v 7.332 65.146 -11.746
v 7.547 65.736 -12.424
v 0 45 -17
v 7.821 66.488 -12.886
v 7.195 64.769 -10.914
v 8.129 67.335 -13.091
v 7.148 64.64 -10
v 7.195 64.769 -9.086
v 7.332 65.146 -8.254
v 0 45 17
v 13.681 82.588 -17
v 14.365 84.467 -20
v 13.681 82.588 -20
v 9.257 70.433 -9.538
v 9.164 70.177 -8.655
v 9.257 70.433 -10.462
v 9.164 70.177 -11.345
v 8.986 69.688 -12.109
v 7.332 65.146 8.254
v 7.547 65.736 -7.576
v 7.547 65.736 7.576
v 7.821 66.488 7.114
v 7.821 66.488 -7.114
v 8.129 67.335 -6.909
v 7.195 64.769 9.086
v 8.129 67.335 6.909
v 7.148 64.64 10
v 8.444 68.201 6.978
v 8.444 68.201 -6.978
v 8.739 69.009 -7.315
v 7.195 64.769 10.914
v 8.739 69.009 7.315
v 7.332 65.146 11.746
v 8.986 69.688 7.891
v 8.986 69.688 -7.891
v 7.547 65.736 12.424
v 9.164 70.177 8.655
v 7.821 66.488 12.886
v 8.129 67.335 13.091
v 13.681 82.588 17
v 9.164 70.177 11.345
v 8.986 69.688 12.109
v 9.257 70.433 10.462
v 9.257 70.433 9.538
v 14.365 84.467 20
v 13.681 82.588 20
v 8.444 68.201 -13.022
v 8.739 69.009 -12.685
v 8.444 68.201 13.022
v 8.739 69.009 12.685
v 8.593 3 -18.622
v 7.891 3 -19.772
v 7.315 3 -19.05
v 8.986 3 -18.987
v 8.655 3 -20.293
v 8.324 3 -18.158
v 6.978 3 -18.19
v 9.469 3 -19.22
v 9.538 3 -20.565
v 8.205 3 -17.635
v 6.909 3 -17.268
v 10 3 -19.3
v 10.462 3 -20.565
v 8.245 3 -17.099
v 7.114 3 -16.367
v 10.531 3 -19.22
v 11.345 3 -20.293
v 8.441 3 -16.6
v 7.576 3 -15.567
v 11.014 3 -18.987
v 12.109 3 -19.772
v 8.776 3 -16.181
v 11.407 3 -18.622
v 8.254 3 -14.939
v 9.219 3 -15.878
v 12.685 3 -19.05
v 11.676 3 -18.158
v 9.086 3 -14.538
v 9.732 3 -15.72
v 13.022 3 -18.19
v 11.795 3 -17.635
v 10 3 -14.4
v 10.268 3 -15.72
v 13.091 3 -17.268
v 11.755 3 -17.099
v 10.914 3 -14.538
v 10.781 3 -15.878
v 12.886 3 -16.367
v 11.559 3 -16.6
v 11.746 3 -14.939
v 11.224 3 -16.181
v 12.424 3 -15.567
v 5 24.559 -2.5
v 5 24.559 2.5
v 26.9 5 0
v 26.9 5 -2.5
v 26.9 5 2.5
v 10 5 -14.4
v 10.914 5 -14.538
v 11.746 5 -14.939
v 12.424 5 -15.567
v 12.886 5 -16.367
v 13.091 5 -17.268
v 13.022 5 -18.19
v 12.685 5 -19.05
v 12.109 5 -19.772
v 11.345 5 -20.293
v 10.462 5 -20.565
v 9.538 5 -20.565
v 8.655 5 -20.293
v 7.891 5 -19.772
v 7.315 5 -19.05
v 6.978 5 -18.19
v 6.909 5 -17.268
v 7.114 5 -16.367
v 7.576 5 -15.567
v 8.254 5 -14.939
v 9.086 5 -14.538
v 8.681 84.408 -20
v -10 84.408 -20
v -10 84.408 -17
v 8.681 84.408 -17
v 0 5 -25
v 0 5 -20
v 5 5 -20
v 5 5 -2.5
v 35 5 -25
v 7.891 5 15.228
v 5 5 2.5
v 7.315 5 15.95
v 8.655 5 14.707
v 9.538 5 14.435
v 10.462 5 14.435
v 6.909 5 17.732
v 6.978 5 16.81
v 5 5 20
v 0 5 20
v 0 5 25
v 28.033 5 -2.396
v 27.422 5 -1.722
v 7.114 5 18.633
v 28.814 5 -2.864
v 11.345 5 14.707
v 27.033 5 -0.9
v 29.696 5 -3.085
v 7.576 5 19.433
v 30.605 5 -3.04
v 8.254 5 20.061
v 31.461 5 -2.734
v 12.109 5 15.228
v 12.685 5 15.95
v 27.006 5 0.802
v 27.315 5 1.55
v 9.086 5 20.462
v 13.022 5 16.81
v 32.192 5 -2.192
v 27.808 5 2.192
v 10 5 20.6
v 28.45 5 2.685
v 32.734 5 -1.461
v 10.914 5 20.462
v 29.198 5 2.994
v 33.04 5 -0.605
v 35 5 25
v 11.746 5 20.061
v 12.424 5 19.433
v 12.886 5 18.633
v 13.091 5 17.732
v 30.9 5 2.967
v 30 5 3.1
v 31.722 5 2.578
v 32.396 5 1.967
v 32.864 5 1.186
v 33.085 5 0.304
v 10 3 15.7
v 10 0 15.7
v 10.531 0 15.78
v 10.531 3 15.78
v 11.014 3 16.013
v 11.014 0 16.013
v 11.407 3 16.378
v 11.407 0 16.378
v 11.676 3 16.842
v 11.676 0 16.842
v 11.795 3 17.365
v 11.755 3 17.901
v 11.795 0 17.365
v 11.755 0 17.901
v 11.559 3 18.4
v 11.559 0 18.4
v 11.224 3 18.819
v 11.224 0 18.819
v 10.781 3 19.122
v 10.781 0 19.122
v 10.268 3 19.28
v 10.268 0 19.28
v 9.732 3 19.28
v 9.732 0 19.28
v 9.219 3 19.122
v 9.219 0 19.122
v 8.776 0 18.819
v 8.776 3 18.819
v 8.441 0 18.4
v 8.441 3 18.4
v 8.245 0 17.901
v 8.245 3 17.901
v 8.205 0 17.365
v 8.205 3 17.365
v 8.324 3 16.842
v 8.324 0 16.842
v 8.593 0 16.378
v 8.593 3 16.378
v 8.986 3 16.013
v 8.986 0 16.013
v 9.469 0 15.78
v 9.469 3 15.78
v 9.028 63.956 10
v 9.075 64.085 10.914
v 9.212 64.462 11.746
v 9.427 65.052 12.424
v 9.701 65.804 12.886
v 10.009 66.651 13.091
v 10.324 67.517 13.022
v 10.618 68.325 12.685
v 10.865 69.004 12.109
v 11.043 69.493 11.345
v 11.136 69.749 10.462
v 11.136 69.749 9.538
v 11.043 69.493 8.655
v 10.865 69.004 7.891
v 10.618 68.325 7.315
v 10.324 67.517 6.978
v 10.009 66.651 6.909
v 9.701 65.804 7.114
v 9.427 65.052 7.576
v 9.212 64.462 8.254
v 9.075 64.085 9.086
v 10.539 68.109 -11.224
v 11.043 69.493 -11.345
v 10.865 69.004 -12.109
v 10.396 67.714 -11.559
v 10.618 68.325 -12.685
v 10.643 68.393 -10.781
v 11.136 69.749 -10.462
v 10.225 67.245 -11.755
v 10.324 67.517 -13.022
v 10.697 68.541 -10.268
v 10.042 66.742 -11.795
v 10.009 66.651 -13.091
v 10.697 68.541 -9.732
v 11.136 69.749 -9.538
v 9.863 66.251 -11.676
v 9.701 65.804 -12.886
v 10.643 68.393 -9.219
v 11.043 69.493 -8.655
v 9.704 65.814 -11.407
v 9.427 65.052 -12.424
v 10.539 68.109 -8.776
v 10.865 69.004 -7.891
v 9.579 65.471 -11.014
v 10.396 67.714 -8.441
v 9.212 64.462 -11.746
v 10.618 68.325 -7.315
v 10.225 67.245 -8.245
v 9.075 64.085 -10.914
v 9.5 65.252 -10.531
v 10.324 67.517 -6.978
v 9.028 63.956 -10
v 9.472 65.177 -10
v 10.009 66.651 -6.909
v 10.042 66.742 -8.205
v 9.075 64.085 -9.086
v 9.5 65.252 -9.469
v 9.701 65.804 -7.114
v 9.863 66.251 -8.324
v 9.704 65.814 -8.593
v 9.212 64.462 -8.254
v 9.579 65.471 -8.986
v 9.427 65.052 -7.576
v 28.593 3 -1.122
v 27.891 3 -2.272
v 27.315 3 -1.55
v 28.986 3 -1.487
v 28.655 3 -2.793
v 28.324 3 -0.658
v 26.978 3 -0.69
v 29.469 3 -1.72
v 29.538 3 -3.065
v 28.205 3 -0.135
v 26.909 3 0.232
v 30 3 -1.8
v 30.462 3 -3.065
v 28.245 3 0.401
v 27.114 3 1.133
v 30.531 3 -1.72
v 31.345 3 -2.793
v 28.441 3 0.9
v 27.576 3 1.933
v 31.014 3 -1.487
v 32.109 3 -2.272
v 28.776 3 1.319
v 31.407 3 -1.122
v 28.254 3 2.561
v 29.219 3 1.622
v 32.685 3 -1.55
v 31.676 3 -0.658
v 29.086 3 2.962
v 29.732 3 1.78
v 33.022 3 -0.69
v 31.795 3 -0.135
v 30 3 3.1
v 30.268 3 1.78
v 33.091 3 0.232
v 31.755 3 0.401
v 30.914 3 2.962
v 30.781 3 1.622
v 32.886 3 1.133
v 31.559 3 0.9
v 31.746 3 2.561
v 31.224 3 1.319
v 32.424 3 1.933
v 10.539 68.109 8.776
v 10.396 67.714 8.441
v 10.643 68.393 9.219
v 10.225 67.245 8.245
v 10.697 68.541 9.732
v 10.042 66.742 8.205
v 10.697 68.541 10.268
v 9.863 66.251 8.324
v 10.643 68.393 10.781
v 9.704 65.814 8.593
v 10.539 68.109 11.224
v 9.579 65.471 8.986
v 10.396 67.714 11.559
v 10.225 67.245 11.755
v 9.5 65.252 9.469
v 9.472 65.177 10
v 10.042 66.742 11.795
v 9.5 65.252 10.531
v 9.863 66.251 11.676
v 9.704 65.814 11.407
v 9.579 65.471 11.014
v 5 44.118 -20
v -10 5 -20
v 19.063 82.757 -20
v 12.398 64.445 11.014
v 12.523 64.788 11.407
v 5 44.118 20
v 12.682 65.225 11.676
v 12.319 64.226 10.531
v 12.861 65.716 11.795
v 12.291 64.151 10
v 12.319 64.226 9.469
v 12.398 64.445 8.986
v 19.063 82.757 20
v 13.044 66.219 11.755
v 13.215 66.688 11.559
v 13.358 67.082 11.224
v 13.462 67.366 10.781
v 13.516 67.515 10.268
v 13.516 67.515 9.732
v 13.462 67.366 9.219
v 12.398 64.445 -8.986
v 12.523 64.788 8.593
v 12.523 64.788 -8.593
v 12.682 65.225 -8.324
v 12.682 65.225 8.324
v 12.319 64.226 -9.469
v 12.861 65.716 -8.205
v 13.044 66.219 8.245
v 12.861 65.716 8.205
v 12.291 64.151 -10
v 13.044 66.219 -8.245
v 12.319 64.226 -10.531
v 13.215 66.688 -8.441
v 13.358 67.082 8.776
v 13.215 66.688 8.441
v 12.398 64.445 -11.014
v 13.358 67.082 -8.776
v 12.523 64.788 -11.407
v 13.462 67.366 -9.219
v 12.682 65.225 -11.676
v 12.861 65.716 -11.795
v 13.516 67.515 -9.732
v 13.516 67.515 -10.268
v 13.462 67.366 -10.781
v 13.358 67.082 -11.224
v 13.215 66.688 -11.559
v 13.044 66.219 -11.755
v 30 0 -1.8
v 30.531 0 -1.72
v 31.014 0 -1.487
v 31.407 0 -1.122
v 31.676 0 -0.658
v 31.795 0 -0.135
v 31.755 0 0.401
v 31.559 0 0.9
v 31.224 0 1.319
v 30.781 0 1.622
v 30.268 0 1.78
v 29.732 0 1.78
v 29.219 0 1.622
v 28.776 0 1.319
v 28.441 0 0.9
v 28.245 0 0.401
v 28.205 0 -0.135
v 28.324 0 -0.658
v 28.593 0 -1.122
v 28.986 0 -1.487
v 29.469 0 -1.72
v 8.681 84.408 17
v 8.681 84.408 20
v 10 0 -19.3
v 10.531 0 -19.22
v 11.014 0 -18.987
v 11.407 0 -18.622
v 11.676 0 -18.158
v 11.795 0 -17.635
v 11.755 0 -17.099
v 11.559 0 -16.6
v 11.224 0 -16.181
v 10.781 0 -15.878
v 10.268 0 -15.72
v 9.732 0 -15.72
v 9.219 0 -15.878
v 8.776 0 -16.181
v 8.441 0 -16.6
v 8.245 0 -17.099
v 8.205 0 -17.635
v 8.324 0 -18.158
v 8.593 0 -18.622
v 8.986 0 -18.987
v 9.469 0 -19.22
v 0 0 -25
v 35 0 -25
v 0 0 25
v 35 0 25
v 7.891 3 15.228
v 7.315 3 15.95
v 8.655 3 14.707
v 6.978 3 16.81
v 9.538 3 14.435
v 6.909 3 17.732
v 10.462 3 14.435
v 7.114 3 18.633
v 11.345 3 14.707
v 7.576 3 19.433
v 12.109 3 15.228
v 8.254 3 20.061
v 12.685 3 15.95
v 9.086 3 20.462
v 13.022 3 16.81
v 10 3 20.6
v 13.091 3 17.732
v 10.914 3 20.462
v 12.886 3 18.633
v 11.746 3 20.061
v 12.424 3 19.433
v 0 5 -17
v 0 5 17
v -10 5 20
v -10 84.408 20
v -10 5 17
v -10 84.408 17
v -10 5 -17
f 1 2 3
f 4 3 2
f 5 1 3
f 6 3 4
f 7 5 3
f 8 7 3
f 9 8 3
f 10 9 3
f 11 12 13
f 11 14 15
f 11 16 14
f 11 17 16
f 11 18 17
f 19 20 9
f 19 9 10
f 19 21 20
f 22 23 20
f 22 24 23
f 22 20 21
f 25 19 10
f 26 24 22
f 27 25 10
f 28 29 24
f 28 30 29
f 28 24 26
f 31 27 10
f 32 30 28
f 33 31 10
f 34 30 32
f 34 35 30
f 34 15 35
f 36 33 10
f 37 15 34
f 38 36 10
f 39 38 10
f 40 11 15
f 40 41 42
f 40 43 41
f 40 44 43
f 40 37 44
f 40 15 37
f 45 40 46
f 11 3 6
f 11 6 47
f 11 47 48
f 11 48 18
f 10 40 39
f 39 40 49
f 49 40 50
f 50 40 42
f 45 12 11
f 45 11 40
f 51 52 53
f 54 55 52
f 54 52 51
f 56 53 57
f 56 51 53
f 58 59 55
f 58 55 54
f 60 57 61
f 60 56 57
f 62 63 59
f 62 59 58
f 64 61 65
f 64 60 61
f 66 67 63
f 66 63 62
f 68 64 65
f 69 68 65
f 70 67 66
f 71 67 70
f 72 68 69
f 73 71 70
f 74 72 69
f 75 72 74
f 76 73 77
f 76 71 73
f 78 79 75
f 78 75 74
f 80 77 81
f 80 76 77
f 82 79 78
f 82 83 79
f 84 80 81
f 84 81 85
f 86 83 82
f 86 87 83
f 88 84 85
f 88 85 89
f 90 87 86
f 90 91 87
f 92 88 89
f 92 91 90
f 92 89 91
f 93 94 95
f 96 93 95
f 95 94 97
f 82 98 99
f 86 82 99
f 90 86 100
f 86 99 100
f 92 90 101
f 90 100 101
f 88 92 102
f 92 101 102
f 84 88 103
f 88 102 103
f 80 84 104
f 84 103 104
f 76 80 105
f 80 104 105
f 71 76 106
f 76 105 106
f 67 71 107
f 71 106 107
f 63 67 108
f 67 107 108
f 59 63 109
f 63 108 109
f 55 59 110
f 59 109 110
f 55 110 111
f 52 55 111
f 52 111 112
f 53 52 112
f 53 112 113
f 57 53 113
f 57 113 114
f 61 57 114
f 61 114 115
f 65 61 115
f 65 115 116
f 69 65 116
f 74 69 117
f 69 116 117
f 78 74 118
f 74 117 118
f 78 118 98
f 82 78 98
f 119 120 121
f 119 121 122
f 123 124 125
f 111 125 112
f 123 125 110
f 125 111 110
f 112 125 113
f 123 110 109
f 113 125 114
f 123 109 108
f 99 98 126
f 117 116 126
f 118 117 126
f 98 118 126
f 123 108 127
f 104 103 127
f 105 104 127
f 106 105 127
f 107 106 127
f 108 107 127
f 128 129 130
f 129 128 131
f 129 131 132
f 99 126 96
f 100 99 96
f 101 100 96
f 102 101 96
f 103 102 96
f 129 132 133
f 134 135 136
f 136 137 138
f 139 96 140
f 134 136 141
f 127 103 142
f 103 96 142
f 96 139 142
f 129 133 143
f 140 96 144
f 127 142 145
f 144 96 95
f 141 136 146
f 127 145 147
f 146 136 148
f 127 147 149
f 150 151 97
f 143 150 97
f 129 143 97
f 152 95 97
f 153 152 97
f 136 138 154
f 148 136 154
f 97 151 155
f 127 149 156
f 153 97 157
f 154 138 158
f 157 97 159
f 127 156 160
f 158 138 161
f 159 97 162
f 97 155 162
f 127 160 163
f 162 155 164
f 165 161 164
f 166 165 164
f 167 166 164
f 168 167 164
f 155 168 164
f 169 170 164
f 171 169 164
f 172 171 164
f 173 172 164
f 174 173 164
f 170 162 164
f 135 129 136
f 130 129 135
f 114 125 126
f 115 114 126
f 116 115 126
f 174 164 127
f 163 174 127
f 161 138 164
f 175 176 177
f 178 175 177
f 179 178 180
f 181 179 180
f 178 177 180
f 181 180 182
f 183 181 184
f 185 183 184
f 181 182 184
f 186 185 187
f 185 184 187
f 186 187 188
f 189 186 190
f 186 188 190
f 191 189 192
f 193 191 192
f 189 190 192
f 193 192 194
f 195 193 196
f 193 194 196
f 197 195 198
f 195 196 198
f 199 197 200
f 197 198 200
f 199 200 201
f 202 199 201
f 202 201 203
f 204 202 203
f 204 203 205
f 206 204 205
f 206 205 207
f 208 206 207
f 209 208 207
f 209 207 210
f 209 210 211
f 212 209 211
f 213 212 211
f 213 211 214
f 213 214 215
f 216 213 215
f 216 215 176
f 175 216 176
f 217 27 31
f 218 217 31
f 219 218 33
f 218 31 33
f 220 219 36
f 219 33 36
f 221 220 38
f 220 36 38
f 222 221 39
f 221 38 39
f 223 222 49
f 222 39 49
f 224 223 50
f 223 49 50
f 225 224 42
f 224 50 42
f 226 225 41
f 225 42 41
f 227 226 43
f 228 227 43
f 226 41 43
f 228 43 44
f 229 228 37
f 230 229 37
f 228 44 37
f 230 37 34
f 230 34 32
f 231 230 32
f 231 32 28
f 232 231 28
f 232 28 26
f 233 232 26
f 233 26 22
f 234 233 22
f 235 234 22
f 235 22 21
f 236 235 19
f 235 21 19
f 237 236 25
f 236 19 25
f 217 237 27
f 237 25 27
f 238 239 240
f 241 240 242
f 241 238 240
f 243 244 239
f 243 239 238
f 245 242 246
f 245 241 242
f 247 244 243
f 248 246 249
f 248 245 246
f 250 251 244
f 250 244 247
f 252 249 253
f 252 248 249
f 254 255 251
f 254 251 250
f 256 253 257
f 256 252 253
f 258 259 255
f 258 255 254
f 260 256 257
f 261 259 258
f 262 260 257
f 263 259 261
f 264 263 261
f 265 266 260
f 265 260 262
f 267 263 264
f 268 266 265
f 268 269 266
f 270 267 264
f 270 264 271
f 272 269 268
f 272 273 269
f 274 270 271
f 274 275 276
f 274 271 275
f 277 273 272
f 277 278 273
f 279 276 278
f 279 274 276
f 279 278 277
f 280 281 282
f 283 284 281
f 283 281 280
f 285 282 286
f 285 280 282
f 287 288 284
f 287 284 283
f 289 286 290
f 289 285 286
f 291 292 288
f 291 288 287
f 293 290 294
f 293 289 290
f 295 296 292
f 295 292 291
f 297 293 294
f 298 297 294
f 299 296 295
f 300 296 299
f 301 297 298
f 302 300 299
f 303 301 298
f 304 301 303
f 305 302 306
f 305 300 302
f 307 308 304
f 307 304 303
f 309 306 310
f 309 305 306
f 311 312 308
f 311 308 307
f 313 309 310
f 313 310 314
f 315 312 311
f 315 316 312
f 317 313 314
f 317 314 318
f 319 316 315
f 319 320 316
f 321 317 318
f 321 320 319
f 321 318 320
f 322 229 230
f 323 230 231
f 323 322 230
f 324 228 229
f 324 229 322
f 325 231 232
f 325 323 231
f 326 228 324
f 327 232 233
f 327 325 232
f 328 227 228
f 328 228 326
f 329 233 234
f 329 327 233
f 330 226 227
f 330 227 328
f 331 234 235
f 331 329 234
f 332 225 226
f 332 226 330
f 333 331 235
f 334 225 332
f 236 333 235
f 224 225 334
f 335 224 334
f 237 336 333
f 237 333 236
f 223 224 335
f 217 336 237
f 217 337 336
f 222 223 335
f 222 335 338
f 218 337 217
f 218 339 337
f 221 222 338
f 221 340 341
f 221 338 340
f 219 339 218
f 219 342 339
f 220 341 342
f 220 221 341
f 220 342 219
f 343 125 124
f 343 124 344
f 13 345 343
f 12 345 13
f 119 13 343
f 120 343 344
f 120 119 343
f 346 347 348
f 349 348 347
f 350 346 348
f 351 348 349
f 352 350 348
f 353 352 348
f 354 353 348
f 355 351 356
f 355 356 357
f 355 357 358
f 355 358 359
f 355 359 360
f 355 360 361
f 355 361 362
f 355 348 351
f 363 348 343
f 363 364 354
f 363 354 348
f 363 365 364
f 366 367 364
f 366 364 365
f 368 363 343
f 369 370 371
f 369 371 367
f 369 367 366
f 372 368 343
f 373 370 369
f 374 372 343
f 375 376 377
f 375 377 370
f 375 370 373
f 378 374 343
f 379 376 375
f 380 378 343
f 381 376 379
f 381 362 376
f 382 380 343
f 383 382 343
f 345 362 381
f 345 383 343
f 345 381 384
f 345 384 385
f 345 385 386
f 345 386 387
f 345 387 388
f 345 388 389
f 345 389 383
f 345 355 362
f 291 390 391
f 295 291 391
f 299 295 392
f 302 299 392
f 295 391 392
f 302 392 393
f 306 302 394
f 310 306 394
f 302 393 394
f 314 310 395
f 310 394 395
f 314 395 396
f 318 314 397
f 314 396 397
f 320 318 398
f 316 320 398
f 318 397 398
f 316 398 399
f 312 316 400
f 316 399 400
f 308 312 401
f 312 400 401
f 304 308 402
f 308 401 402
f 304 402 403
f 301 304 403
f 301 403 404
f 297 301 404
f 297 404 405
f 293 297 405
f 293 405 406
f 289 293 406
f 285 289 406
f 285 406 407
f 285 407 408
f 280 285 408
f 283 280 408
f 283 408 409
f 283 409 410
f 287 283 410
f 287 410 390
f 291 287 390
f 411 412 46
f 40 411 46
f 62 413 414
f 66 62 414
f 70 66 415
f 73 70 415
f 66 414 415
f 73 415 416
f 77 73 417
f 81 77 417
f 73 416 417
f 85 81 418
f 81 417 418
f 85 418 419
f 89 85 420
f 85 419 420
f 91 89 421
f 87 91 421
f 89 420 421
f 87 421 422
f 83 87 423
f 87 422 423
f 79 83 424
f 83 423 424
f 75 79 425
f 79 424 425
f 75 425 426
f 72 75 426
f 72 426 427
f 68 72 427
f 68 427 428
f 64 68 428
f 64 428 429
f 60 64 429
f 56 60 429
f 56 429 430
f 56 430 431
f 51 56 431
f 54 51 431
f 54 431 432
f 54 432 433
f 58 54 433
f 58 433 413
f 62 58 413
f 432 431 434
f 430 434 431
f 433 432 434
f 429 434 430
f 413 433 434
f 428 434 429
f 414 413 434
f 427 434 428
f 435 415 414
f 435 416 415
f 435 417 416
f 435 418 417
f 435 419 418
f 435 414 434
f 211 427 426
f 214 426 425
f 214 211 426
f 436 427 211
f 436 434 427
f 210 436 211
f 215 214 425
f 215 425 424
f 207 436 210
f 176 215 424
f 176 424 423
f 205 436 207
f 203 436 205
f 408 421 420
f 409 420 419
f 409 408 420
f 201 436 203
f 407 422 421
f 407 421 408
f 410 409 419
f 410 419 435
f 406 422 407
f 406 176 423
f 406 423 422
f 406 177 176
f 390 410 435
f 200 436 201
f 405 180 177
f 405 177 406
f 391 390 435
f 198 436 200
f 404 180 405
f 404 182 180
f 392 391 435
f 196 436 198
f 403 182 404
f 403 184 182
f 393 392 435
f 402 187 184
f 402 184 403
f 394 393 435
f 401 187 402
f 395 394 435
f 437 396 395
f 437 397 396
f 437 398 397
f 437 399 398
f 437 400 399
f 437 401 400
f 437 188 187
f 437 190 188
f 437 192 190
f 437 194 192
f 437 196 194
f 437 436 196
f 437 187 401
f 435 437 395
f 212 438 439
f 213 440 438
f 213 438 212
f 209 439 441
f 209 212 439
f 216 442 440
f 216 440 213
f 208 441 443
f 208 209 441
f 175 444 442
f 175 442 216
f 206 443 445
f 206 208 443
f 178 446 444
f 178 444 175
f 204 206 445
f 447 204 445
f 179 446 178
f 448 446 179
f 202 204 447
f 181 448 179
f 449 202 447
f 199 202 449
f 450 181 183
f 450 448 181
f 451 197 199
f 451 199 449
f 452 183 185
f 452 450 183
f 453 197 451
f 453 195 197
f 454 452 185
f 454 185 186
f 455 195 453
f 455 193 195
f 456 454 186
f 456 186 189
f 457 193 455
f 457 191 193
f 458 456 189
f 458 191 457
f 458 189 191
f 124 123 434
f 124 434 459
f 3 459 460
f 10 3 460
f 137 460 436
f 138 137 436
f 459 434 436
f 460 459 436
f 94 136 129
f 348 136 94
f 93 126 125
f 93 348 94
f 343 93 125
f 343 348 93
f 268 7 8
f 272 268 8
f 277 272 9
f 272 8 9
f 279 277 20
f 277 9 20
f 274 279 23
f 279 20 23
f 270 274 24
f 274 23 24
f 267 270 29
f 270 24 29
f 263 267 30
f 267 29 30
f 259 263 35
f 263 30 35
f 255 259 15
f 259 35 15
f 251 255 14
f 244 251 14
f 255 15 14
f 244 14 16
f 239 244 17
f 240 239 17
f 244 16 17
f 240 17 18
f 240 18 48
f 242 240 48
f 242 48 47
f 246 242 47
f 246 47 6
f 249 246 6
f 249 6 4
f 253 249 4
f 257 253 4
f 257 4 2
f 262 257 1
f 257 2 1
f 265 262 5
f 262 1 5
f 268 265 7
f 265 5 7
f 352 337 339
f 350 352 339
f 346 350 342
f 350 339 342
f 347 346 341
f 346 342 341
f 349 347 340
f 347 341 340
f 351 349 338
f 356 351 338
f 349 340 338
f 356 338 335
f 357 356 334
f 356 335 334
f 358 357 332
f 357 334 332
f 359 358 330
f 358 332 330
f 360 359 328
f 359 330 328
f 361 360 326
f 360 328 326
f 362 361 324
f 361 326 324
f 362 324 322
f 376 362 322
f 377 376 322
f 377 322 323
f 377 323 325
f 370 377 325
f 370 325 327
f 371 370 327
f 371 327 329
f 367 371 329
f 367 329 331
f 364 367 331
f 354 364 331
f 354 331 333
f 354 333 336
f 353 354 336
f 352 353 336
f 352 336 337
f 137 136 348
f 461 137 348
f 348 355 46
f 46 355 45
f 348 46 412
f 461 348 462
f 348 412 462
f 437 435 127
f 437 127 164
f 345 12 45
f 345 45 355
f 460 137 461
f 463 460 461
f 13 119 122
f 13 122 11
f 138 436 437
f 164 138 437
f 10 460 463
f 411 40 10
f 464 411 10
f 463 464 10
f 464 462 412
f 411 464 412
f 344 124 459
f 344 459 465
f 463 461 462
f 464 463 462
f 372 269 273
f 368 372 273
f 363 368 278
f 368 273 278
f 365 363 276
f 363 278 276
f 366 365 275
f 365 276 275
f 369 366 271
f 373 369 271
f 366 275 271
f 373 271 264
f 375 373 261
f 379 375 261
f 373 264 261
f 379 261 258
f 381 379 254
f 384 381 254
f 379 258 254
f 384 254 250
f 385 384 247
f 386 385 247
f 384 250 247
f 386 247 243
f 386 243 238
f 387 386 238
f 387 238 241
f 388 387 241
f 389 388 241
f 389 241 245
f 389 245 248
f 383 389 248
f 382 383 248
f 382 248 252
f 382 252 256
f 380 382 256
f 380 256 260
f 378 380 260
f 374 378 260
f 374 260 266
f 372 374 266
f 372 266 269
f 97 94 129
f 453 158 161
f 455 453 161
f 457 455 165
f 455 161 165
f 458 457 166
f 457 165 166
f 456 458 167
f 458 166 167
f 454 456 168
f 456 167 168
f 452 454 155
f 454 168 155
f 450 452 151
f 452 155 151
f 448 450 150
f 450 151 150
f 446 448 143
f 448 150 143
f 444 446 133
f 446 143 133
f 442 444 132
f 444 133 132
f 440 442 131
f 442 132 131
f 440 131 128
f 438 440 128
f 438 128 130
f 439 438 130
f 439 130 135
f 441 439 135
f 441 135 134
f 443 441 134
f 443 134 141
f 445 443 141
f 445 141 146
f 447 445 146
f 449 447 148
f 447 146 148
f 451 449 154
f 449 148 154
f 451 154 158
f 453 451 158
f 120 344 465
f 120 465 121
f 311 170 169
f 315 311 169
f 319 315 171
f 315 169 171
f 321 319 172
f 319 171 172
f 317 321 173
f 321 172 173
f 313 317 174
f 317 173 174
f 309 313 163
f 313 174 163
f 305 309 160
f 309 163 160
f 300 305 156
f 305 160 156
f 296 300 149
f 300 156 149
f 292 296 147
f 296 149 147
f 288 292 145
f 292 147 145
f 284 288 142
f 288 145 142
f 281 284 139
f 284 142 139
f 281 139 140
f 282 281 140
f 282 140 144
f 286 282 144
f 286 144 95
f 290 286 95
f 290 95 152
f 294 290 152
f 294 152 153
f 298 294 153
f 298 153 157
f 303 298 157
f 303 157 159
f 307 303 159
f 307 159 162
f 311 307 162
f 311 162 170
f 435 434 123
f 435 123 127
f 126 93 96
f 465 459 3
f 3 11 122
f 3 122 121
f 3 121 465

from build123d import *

# Parameters (mm, degrees)
SKETCH_2_W          = 5
SKETCH_2_H          = 40
CUT_EXTRUDE_1_REACH = 90.301
SKETCH_3_R          = 1.8
SKETCH_6_W          = 30
SKETCH_6_H          = 40
EXTRUDE_1_DEPTH     = 5
CUT_EXTRUDE_2_REACH = 95.593
SKETCH_8_R          = 1.8
SKETCH_9_W          = 35
SKETCH_9_H          = 5
EXTRUDE_2_DEPTH     = 5
SKETCH_10_R         = 3.1
CUT_EXTRUDE_3_DEPTH = 2
SKETCH_11_R         = 3.1
CUT_EXTRUDE_4_DEPTH = 2
EXTRUDE_4_DEPTH     = 3
RIB_5_REACH         = 96.788
SKETCH_21_WALL_W    = 220.937961122
SKETCH_21_WALL_H    = 5


with BuildPart() as part:
    # 扫描1: sweep along a path in 草图1
    with BuildLine(Plane.XY) as sweep_1_path:
        Line((0, 0), (0, 45))
        Line((0, 45), (14.36484602, 84.467090073))
    # 草图2 → 扫描1 (sweep)
    with BuildSketch(Plane(origin=(0, 0, 0), x_dir=(1, 0, 0), z_dir=(0, 1, 0))):
        with Locations((2.5, 0)):
            Rectangle(SKETCH_2_W, SKETCH_2_H)
    sweep(path=sweep_1_path.line, transition=Transition.RIGHT)

    # 草图3 → 切除-拉伸1 (cut, up to next)
    with BuildSketch(Plane(origin=(-14.462721218, 5.26400003, 0), x_dir=(0, 0, 1), z_dir=(-0.9396926207859081, 0.3420201433256695, 0)), mode=Mode.PRIVATE) as cut_extrude_1_sk1:
        with Locations(Location((-10, 66.286167935, 0), (0, 0, 270))):
            Circle(SKETCH_3_R)
    cut_extrude_1_tool1 = extrude(cut_extrude_1_sk1.sketch, amount=-CUT_EXTRUDE_1_REACH, mode=Mode.PRIVATE) & part.part
    # 草图3 → 切除-拉伸1 (cut, up to next)
    with BuildSketch(Plane(origin=(-14.462721218, 5.26400003, 0), x_dir=(0, 0, 1), z_dir=(-0.9396926207859081, 0.3420201433256695, 0)), mode=Mode.PRIVATE) as cut_extrude_1_sk2:
        with Locations(Location((10, 66.286167935, 0), (0, 0, 270))):
            Circle(SKETCH_3_R)
    cut_extrude_1_tool2 = extrude(cut_extrude_1_sk2.sketch, amount=-CUT_EXTRUDE_1_REACH, mode=Mode.PRIVATE) & part.part
    add(cut_extrude_1_tool1.solids().sort_by_distance((8.208483, 67.552623, -10))[0], mode=Mode.SUBTRACT)
    add(cut_extrude_1_tool2.solids().sort_by_distance((8.208483, 67.552623, 10))[0], mode=Mode.SUBTRACT)

    # 草图6 → 凸台-拉伸1 (add)
    with BuildSketch(Plane.XZ):
        with Locations((20, 0)):
            Rectangle(SKETCH_6_W, SKETCH_6_H)
    extrude(amount=-EXTRUDE_1_DEPTH)

    # 草图8 → 切除-拉伸2 (cut, up to next)
    with BuildSketch(Plane.XZ, mode=Mode.PRIVATE) as cut_extrude_2_sk1:
        with Locations(Location((10, 17.5, 0), (0, 0, 270))):
            Circle(SKETCH_8_R)
    cut_extrude_2_tool1 = extrude(cut_extrude_2_sk1.sketch, amount=-CUT_EXTRUDE_2_REACH, mode=Mode.PRIVATE) & part.part
    # 草图8 → 切除-拉伸2 (cut, up to next)
    with BuildSketch(Plane.XZ, mode=Mode.PRIVATE) as cut_extrude_2_sk2:
        with Locations(Location((10, -17.5, 0), (0, 0, 270))):
            Circle(SKETCH_8_R)
    cut_extrude_2_tool2 = extrude(cut_extrude_2_sk2.sketch, amount=-CUT_EXTRUDE_2_REACH, mode=Mode.PRIVATE) & part.part
    # 草图8 → 切除-拉伸2 (cut, up to next)
    with BuildSketch(Plane.XZ, mode=Mode.PRIVATE) as cut_extrude_2_sk3:
        with Locations(Location((30, 0, 0), (0, 0, 270))):
            Circle(SKETCH_8_R)
    cut_extrude_2_tool3 = extrude(cut_extrude_2_sk3.sketch, amount=-CUT_EXTRUDE_2_REACH, mode=Mode.PRIVATE) & part.part
    add(cut_extrude_2_tool1.solids().sort_by_distance((10, 0, 17.5))[0], mode=Mode.SUBTRACT)
    add(cut_extrude_2_tool2.solids().sort_by_distance((10, 0, -17.5))[0], mode=Mode.SUBTRACT)
    add(cut_extrude_2_tool3.solids().sort_by_distance((30, 0, 0))[0], mode=Mode.SUBTRACT)

    # 草图9 → 凸台-拉伸2 (add)
    with BuildSketch(Plane.XZ):
        with Locations((17.5, 22.5)):
            Rectangle(SKETCH_9_W, SKETCH_9_H)
        with Locations((17.5, -22.5)):
            Rectangle(SKETCH_9_W, SKETCH_9_H)
    extrude(amount=-EXTRUDE_2_DEPTH)

    # 草图10 → 切除-拉伸3 (cut)
    with BuildSketch(Plane(origin=(0, 5, 0), x_dir=(1, 0, 0), z_dir=(0, 1, 0))):
        with Locations(Location((10, -17.5, 0), (0, 0, 270))):
            Circle(SKETCH_10_R)
        with Locations(Location((10, 17.5, 0), (0, 0, 270))):
            Circle(SKETCH_10_R)
        with Locations(Location((30, 0, 0), (0, 0, 270))):
            Circle(SKETCH_10_R)
    extrude(amount=-CUT_EXTRUDE_3_DEPTH, mode=Mode.SUBTRACT)

    # 草图11 → 切除-拉伸4 (cut)
    with BuildSketch(Plane(origin=(-14.462721218, 5.26400003, 0), x_dir=(0, 0, 1), z_dir=(-0.9396926207859081, 0.3420201433256695, 0))):
        with Locations(Location((-10, 66.286167935, 0), (0, 0, 270))):
            Circle(SKETCH_11_R)
        with Locations(Location((10, 66.286167935, 0), (0, 0, 270))):
            Circle(SKETCH_11_R)
    extrude(amount=-CUT_EXTRUDE_4_DEPTH, mode=Mode.SUBTRACT)

    # 草图15 → 凸台-拉伸4 (add)
    with BuildSketch(Plane(origin=(0, 0, -20), x_dir=(-1, 0, 0), z_dir=(0, 0, -1))):
        Polygon((-8.680805733, 84.407556003), (-13.680805733, 82.587704831), (0, 45), (0, 5), (10, 5), (10, 84.407556003), align=None)
    extrude_4 = extrude(amount=-EXTRUDE_4_DEPTH)

    # 镜向2: 凸台-拉伸4 across plane
    add(extrude_4.mirror(Plane(origin=(0, 0, 0), x_dir=(1, 0, 0), z_dir=(0, 0, -1))))

    # 草图21 wall → 筋5 (add, up to next)
    with BuildSketch(Plane(origin=(15.95, 14.779591274, 0), x_dir=(0.745842716131, -0.666122093009, 0), z_dir=(-0.666122093009, -0.745842716131, 0)), mode=Mode.PRIVATE) as rib_5_sk1:
        Rectangle(SKETCH_21_WALL_W, SKETCH_21_WALL_H)
    rib_5_tool1 = extrude(rib_5_sk1.sketch, amount=RIB_5_REACH, mode=Mode.PRIVATE) - part.part
    add(rib_5_tool1.solids().sort_by_distance((15.95, 14.779591274, 0))[0])


solid = part.part
